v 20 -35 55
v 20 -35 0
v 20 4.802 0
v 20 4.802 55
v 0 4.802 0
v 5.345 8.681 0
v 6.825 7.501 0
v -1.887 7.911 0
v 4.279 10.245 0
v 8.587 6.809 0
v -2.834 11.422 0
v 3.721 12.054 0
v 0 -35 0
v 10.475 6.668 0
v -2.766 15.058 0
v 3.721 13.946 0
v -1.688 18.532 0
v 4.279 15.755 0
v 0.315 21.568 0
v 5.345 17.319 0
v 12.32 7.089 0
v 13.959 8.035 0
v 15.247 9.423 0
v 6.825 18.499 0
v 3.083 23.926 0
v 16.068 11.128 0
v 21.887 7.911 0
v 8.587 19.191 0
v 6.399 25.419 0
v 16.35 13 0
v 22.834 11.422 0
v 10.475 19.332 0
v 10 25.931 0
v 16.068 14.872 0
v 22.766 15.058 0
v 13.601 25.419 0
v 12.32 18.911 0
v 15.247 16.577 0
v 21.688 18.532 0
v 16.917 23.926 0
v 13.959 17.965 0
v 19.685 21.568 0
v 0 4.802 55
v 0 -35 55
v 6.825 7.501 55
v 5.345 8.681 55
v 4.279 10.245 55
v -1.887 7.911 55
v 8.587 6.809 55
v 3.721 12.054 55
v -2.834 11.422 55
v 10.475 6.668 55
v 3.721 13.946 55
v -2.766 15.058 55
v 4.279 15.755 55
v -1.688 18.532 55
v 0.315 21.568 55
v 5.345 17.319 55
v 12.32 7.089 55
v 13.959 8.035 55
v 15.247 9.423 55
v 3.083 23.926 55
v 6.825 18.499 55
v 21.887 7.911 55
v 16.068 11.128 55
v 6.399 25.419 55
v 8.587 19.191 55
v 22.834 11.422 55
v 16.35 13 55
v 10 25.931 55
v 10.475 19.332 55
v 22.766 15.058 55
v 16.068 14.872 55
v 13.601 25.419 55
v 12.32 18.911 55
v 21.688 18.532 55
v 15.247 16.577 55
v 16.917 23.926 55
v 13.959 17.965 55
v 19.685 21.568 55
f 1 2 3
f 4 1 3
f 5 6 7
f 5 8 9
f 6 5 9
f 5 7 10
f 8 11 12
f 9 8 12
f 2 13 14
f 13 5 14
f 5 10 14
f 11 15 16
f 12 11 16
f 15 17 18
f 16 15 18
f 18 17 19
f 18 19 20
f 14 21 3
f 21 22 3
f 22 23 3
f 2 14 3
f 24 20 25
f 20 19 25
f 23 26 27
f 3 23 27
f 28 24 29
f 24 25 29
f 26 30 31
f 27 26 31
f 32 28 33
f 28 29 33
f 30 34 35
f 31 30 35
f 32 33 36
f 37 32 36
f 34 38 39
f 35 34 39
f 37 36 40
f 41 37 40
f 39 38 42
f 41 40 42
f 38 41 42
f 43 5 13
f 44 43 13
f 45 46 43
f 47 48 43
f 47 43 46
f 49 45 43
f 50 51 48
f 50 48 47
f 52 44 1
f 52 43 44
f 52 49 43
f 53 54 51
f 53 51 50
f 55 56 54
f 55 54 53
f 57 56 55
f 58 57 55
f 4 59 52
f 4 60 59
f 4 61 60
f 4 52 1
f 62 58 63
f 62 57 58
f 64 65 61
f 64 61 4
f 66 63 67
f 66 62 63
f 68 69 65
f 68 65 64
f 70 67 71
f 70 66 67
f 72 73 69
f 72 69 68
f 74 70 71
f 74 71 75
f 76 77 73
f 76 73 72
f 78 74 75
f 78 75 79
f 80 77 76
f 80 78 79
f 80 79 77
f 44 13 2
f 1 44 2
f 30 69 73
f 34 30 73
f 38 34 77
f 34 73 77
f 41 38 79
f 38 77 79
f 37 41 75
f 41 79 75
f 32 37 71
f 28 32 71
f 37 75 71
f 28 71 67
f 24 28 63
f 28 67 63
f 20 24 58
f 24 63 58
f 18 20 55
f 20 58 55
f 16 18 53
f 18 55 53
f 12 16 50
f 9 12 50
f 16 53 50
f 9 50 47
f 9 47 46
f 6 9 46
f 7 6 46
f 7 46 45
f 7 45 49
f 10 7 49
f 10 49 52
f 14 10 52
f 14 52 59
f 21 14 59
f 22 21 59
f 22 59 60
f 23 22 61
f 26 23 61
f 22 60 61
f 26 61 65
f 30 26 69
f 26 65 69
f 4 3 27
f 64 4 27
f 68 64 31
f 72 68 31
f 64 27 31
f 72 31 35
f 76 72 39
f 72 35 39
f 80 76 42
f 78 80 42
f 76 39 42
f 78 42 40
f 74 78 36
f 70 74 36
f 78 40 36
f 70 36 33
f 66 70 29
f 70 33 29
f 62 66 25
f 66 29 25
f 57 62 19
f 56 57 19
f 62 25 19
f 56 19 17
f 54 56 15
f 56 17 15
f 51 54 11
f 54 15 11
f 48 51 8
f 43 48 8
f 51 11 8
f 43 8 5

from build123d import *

# Parameters (mm, degrees)
SALIENTE_EXTRUIR1_DEPTH = 55
CROQUIS2_R              = 6.35
CORTAR_EXTRUIR1_DEPTH   = 55


with BuildPart() as part:
    # Croquis1 → Saliente-Extruir1 (new body)
    with BuildSketch(Plane.XY):
        with BuildLine():
            Line((0, 0), (0, -35))
            Line((0, -35), (20, -35))
            Line((20, -35), (20, 0))
            Line((20, 0), (20, 4.801960973))
            ThreePointArc((20, 4.801960973), (10, 25.930887204), (0, 4.801960973))
            Line((0, 4.801960973), (0, 0))
        make_face()
    extrude(amount=SALIENTE_EXTRUIR1_DEPTH)

    # Croquis2 → Cortar-Extruir1 (cut)
    with BuildSketch(Plane.XY.offset(55)):
        with Locations((10, 13)):
            Circle(CROQUIS2_R)
    extrude(amount=-CORTAR_EXTRUIR1_DEPTH, mode=Mode.SUBTRACT)


solid = part.part
